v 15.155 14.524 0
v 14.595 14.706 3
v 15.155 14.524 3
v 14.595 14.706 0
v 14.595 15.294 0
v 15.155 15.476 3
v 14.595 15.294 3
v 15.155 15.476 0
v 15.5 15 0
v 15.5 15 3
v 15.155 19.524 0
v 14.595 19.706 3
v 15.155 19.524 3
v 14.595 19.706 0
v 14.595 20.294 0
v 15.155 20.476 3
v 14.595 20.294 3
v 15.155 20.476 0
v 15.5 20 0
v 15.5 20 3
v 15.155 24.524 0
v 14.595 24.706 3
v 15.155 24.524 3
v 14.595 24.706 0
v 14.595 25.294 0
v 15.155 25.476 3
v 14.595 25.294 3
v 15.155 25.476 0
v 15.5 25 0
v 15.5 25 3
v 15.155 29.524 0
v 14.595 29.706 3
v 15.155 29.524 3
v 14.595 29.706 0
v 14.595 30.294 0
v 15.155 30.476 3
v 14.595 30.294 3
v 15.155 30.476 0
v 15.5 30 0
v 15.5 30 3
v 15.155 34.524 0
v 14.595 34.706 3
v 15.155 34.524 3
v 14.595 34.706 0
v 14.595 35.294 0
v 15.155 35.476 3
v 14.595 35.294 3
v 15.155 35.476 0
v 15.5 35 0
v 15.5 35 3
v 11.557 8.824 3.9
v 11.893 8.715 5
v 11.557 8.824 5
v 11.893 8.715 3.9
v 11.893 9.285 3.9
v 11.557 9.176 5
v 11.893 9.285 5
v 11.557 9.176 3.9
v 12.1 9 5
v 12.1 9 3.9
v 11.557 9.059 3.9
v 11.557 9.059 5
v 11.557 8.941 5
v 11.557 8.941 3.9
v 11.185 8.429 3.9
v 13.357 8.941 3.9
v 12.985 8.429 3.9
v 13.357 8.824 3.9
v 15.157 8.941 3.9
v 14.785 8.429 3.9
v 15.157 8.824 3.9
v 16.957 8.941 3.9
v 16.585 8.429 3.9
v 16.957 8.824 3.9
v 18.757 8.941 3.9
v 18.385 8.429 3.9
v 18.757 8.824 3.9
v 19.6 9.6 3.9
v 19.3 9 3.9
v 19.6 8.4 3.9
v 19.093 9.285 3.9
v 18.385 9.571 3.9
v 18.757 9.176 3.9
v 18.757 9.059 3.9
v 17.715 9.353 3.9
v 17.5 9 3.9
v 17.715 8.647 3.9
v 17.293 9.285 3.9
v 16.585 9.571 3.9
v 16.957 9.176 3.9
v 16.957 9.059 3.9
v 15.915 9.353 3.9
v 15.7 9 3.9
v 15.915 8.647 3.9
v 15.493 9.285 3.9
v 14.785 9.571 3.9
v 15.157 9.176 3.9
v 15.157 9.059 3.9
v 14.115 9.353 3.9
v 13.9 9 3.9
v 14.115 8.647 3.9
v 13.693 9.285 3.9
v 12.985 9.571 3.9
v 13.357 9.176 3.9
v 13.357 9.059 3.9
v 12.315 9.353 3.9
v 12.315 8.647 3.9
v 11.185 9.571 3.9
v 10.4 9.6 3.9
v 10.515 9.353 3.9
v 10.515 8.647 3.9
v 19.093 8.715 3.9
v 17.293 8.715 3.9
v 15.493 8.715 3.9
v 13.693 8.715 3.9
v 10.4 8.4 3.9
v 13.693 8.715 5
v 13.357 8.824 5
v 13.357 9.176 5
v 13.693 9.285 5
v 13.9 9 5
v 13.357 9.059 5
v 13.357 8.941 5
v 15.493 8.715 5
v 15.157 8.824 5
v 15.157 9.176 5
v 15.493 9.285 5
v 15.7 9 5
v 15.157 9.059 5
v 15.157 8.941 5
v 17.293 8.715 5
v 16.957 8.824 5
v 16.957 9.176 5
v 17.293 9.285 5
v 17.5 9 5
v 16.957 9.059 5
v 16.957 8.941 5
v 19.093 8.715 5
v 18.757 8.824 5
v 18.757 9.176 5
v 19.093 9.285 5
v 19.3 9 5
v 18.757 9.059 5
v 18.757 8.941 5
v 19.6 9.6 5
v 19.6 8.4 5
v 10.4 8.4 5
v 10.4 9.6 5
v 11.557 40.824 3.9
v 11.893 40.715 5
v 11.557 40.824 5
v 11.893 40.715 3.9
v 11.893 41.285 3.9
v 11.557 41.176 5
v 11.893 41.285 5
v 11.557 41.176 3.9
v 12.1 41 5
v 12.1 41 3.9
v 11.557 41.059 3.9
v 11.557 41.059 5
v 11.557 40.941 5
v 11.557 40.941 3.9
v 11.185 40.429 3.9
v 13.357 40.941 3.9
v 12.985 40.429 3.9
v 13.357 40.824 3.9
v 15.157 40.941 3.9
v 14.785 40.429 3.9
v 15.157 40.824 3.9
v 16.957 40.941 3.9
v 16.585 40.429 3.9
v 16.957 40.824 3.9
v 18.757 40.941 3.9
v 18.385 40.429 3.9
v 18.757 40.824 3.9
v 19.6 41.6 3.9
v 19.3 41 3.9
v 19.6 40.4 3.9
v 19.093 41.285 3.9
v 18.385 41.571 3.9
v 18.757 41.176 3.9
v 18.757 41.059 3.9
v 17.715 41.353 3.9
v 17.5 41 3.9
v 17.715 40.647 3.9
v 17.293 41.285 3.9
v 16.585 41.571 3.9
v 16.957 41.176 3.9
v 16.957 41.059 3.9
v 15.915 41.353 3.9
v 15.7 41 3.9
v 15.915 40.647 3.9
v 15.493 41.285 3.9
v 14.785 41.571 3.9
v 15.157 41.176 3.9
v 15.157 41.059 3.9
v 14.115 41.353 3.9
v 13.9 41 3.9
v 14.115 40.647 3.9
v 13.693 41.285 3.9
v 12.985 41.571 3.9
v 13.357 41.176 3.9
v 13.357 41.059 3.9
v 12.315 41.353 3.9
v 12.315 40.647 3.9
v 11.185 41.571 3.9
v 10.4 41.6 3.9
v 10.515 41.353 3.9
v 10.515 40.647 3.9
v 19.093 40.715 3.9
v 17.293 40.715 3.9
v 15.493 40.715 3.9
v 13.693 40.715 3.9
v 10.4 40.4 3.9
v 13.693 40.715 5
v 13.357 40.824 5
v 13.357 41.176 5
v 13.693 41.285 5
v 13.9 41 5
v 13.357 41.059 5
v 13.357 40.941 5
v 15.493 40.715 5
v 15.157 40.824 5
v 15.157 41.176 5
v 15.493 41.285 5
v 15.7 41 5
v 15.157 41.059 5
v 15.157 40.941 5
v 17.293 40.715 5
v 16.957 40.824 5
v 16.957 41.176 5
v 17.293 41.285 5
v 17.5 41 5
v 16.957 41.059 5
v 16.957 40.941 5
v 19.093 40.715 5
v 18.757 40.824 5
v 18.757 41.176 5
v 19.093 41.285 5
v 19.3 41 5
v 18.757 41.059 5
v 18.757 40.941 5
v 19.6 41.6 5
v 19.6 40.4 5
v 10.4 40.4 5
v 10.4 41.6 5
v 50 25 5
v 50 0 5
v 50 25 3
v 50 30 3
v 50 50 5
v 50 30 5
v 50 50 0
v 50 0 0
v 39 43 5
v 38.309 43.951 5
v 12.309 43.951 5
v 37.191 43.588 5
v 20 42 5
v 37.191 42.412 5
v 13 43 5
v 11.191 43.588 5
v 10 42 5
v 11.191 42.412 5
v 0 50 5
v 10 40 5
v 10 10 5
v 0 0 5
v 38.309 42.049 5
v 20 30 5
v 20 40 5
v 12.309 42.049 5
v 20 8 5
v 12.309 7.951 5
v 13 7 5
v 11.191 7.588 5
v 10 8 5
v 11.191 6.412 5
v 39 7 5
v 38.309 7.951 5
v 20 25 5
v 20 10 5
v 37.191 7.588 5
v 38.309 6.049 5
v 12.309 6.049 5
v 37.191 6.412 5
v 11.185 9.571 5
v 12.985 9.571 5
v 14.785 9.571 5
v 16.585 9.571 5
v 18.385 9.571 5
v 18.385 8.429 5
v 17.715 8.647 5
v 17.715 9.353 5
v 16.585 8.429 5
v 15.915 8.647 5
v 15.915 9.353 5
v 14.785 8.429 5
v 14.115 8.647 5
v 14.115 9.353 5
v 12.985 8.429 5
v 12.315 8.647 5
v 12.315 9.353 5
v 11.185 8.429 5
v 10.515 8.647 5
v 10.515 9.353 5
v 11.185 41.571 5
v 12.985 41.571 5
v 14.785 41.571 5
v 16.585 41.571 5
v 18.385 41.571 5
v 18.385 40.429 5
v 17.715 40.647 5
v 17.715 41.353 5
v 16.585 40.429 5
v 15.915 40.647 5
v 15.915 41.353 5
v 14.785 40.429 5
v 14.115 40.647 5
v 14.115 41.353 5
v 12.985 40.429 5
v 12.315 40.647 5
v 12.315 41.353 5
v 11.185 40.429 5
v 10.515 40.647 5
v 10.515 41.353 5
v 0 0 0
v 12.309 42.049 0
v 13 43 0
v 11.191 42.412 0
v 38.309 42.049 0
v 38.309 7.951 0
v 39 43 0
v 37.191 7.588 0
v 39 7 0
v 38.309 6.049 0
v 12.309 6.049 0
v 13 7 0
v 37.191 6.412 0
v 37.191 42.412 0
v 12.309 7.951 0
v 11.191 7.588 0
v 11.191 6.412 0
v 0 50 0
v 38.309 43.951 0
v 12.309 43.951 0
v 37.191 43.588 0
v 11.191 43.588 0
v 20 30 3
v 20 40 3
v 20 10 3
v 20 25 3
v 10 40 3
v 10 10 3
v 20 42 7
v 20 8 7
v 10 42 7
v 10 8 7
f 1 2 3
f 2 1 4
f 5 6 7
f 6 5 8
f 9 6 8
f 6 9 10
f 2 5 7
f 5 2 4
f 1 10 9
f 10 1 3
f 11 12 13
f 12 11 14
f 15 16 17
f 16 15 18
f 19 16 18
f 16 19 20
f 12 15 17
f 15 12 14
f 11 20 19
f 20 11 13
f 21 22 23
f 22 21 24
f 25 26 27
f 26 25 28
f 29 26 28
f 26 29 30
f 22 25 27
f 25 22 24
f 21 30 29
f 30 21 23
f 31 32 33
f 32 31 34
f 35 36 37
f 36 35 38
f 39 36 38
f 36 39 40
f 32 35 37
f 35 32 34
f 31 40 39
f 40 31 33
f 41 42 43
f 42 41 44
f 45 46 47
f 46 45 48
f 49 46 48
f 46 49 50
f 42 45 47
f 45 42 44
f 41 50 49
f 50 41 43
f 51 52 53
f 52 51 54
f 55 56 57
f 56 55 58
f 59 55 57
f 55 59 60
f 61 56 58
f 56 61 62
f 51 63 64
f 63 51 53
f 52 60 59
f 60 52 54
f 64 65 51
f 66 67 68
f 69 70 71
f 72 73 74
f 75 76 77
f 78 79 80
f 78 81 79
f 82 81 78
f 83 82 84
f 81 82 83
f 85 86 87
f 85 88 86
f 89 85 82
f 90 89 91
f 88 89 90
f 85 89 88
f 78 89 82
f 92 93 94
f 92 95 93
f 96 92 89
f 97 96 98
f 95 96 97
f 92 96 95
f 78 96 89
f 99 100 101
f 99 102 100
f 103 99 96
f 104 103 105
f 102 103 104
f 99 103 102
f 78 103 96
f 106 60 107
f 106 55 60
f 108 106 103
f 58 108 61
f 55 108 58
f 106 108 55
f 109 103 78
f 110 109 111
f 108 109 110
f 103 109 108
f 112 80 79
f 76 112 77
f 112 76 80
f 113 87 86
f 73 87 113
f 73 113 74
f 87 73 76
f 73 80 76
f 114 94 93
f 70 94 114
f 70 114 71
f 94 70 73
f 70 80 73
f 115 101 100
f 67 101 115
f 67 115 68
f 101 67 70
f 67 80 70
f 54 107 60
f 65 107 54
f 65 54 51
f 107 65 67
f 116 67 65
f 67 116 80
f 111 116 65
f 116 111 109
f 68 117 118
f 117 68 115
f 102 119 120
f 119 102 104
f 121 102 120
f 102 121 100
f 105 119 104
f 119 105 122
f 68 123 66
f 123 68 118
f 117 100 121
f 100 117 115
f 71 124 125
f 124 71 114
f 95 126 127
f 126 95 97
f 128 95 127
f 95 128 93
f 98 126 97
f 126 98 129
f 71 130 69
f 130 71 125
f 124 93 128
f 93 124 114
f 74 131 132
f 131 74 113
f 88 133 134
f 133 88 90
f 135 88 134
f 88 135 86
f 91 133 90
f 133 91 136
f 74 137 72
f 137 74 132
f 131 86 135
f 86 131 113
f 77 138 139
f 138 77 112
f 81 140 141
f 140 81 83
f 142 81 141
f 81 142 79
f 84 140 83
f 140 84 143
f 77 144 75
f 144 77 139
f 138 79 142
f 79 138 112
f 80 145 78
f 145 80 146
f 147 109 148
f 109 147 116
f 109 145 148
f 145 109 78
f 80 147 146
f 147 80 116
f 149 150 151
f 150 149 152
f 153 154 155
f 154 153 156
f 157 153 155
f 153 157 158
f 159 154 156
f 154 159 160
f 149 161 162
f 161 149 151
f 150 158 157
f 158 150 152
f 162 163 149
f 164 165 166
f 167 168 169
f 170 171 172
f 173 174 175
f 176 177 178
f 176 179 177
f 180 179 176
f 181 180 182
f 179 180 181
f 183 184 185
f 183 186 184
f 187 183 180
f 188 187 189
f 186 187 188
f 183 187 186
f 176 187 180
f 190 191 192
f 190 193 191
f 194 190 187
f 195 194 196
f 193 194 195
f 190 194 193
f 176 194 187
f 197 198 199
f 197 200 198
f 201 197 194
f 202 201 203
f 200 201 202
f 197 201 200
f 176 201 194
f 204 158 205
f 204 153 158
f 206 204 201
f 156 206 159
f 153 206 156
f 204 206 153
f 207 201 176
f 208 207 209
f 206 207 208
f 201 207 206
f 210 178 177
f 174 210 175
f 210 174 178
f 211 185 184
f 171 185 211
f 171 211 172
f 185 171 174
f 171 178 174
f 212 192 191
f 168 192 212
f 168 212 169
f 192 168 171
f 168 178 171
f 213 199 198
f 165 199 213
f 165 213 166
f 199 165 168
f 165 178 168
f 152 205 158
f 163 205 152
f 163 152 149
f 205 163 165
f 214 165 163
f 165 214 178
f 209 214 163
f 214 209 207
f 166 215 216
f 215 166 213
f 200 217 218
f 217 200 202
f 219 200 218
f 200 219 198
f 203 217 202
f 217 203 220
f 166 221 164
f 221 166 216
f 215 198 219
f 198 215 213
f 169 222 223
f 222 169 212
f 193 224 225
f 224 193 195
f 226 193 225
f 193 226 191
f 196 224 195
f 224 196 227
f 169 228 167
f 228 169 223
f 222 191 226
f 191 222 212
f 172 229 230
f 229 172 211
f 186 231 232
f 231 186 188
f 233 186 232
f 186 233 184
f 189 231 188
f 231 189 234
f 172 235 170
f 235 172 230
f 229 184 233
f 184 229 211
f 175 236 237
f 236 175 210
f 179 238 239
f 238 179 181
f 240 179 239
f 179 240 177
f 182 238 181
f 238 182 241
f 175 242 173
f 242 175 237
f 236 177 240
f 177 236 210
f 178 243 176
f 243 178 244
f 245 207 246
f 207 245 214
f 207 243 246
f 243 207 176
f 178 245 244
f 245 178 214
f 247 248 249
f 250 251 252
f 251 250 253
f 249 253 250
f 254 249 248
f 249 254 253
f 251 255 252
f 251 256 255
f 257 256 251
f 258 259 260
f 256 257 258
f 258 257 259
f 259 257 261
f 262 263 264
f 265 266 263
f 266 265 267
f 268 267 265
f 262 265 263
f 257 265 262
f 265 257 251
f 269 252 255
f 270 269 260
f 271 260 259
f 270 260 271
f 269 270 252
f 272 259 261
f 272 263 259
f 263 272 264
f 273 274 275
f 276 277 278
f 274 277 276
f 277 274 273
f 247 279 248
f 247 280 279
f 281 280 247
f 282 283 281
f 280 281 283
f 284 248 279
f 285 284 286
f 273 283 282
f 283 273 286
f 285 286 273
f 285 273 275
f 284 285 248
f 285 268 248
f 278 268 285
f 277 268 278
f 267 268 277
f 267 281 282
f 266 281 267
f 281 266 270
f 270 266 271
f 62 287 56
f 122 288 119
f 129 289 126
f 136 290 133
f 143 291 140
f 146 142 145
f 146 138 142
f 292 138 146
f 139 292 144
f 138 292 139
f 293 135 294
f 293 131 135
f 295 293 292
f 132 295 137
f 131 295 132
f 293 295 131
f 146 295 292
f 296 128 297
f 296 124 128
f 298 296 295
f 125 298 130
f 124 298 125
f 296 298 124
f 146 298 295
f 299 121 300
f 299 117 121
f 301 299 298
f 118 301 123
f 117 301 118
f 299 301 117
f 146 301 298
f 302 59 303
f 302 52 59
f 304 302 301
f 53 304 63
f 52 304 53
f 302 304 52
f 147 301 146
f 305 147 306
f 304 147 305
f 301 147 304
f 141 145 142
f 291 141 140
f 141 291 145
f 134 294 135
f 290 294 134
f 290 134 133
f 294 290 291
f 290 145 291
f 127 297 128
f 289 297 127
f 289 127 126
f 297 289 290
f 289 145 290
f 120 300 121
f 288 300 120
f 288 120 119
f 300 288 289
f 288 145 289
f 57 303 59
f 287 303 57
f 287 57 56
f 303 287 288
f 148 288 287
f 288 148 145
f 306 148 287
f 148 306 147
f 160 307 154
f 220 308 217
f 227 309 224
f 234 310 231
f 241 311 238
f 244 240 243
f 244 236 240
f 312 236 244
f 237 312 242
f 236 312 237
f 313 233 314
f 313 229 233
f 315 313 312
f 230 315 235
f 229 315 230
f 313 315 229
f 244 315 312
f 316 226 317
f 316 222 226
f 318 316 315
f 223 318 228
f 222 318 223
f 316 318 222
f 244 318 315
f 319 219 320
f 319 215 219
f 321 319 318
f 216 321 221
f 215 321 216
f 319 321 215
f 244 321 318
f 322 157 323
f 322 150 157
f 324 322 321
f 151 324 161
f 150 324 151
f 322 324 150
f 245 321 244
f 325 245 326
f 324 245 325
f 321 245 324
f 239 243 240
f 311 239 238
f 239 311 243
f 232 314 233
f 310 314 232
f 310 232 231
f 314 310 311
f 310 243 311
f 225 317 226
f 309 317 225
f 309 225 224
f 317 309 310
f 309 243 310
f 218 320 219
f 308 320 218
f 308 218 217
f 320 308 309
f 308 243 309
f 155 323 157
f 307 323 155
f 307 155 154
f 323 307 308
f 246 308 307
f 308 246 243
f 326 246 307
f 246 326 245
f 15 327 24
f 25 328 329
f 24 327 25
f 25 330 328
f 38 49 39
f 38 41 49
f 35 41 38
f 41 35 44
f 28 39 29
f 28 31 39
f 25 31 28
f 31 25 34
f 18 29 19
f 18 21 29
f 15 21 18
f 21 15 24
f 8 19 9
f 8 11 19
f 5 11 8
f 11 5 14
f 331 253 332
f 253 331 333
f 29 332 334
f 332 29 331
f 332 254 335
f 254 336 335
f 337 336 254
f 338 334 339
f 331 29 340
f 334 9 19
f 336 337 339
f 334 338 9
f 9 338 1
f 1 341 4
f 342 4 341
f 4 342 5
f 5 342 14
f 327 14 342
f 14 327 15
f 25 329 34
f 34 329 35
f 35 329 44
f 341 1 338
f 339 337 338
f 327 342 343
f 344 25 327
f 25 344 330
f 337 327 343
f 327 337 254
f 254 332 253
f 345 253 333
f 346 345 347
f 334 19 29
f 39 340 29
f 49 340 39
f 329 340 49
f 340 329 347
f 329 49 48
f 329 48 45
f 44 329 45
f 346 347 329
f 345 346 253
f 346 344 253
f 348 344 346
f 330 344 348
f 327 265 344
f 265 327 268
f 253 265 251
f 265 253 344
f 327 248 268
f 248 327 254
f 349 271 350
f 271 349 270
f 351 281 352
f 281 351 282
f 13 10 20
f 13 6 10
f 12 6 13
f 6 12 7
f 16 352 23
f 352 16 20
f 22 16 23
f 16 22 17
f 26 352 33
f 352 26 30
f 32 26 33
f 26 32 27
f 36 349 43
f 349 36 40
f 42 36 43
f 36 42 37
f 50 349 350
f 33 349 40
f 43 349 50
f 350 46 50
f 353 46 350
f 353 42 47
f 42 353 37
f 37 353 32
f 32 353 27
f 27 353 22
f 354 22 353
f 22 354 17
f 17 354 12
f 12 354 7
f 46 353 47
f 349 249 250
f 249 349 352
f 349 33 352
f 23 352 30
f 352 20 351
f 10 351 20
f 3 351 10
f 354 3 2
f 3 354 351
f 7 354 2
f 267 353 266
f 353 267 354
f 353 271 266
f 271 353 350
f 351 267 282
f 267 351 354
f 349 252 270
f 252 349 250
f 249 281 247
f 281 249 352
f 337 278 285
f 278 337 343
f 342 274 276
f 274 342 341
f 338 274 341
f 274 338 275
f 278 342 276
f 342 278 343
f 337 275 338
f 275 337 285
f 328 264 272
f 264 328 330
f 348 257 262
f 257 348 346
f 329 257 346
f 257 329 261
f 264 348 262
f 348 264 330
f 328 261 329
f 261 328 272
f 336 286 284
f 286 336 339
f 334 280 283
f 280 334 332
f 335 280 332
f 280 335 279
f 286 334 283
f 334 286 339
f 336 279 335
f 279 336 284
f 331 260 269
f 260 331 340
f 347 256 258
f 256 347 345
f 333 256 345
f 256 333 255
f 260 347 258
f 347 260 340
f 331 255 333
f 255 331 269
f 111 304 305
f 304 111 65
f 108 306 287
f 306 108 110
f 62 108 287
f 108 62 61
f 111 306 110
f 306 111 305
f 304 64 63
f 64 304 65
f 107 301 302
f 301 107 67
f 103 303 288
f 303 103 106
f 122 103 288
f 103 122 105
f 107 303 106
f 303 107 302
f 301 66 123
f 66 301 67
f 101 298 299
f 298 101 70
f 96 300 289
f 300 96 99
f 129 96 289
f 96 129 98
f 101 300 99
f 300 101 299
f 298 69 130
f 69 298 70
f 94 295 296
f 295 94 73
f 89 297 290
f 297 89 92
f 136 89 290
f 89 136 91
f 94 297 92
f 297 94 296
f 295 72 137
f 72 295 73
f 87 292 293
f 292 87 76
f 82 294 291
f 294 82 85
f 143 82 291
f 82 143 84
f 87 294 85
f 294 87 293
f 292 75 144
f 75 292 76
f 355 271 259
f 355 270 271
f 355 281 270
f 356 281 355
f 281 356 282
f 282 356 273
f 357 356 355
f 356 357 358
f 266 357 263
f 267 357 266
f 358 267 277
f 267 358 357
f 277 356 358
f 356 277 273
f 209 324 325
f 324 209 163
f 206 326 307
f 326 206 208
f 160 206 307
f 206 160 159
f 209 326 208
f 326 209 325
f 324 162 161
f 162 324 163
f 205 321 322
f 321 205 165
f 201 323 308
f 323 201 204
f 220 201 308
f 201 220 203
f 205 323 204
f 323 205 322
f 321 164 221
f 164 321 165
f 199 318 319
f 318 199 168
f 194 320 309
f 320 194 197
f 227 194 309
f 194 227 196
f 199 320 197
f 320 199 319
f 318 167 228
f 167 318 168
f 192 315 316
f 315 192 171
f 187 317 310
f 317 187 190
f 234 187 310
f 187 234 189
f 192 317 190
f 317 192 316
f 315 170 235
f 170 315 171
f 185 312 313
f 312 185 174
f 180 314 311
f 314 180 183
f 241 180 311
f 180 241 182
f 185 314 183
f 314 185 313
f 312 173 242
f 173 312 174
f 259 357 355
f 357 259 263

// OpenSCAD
// file: rambo.scad
module pogo_pin () {
  color("Yellow") union() {
    cylinder (r=0.5, h=10);
    translate ([0, 0, 10]) cylinder (r=0.25, h=5);
  }
}

module rambo_board() {
  color("Green") difference() {
    cube([30, 40, 1]);
    translate([2, 2, -1]) cylinder (r=1, h=5);
    translate([28, 38, -1]) cylinder (r=1, h=5);
    translate([2, 38, -1]) cylinder (r=1, h=5);
    translate([28, 2, -1]) cylinder (r=1, h=5);
  }
}

module rambo_connector() {
  color("Gray") cube([3, 5, 5]);
}

module rambo_connectors() {
  /* motors */
  translate([2, 2, 0]) rambo_connector();
  translate([2, 10, 0]) rambo_connector();
  translate([2, 18, 0]) rambo_connector();
  translate([2, 26, 0]) rambo_connector();
  translate([2, 34, 0]) rambo_connector();
  /* endstops */
  translate([10, 29, 0]) rambo_connector();
  translate([10, 35, 0]) rambo_connector();
  translate([14, 29, 0]) rambo_connector();
  translate([14, 35, 0]) rambo_connector();
  /* Thermistors */
  translate([12, 10, 0]) rambo_connector();
  translate([15, 10, 0]) rambo_connector();
  /* USB */
  translate([20, 37, 0]) rambo_connector();
  /* Mosfets */
  translate([25, 20, 0]) rambo_connector();
  translate([25, 25, 0]) rambo_connector();
  translate([25, 30, 0]) rambo_connector();
  translate([25, 33, 0]) rambo_connector();
  /* Power */
  translate([25, 2, 0]) rotate([0, 0, 90]) rambo_connector();
  translate([30, 2, 0]) rotate([0, 0, 90]) rambo_connector();
}

module rambo_pins() {
  /* motors */
  translate([5, 5, 0]) pogo_pin();
  translate([5, 10, 0]) pogo_pin();
  translate([5, 15, 0]) pogo_pin();
  translate([5, 20, 0]) pogo_pin();
  translate([5, 25, 0]) pogo_pin();
  translate([5, 30, 0]) pogo_pin();
  translate([5, 35, 0]) pogo_pin();
  /* endstops */
  translate([12, 30, 0]) pogo_pin();
  translate([12, 32.5, 0]) pogo_pin();
  translate([12, 35, 0]) pogo_pin();
  translate([15, 30, 0]) pogo_pin();
  translate([15, 32.5, 0]) pogo_pin();
  translate([15, 35, 0]) pogo_pin();
  /* ISP */
  translate([20, 12.5, 0]) pogo_pin();
  translate([20, 15, 0]) pogo_pin();
  translate([20, 22.5, 0]) pogo_pin();
  translate([20, 25, 0]) pogo_pin();
  /* Power */
  translate([25, 5, 0]) pogo_pin();
  translate([20, 5, 0]) pogo_pin();
  /* Mosfets */
  translate([25, 20, 0]) pogo_pin();
  translate([25, 25, 0]) pogo_pin();
  translate([25, 35, 0]) pogo_pin();
}

module rambo(connectors=1, holes=0, pins=0) {
  if (connectors) {
    union() {
      rambo_board();
      rambo_connectors();
    }
  } else if (holes) {
    difference() {
      rambo_board();
      translate([0, 0, -1]) rambo_pins();
    }
  } else if (pins) {
    union() {
      rambo_board();
      rambo_pins();
    }
  } else {
    rambo_board();
  }
}

rambo(1, 0, 0);
// file: lego.scad
/*
 * Modified lego code originally copied from canadaduane:
 * https://github.com/canadaduane/Things/blob/master/Lego/lego.scad
 */
 
// Exterior thickness
lego_thickness=2;
wall_thickness=lego_thickness / 5;

// Knobs are the circles on top of blocks
knob_diameter=lego_thickness - (wall_thickness * 2);
knob_height=lego_thickness * 2  / 3;
knob_spacing=knob_diameter * 3/2;


// The 'positive space' of a lego block
module lego_positive(length) {
  num = ((length - (wall_thickness * 2)) / knob_spacing );
  union()
  {
    cube([length, lego_thickness, lego_thickness]);
    translate([knob_diameter / 2 + wall_thickness,
               knob_diameter / 2 + wall_thickness, 0])
      for (xcount=[0:num-1])
        {
          translate([xcount * knob_spacing, 0, lego_thickness])
            cylinder(r=knob_diameter / 2, h=knob_height);
        }
  }
}
 
// The 'negative space' of a lego block
module lego_negative(length) {
  num = ((length - (wall_thickness * 2)) / knob_spacing ) + 1;
  difference()
    {
      translate([wall_thickness, wall_thickness, -0.1])
        cube([length - wall_thickness * 2,
              lego_thickness - wall_thickness * 2,
              knob_height]);
      for (xcount=[1:num-1])
        translate([xcount * knob_spacing, lego_thickness / 2, -0.1])
          cylinder(r=knob_diameter/4,h=knob_height);
    }
}
// main file
use <lego.scad>
use <rambo.scad>

module top_cap() {
  color("Red") union() {
    /* Area for the VRef pogo pins */
    translate([0, 2, 0]) cube([10, 30, 2]);
    /* Lego pins to fit into the holder */
    translate([0, 0, 2])  mirror([0, 0, 1]) lego_positive(10);
    translate([0, 32, 2]) mirror([0, 0, 1]) lego_positive(10);
  }
}

module top_holder() {
  color("OrangeRed") union() {
    difference () {
      /* Holder */
      cube([50, 50, 5]);
      /* Area for the VRef pogo pins */
      translate([10, 10, 3]) cube([10, 30, 5]);
      /* Hole for the cables to go through */
      translate([10, 25, 3]) cube([50, 5, 5]);
      /* VRef pogo pins */
      translate([15, 15, -1]) pogo_pin();
      translate([15, 20, -1]) pogo_pin();
      translate([15, 25, -1]) pogo_pin();
      translate([15, 30, -1]) pogo_pin();
      translate([15, 35, -1]) pogo_pin();
      /* Lego holes for the top_cap to fit into */
      translate([10, 8, 4]) lego_negative(10);
      translate([10, 40, 4]) lego_negative(10);
      /* screw hole */
      translate([12, 7, -1]) cylinder (r=1, h=10);
      translate([12, 43, -1]) cylinder (r=1, h=10);
      translate([38, 7, -1]) cylinder (r=1, h=10);
      translate([38, 43, -1]) cylinder (r=1, h=10);
    }
  }
}

top_holder();
translate([10, 8, 5]) top_cap();
